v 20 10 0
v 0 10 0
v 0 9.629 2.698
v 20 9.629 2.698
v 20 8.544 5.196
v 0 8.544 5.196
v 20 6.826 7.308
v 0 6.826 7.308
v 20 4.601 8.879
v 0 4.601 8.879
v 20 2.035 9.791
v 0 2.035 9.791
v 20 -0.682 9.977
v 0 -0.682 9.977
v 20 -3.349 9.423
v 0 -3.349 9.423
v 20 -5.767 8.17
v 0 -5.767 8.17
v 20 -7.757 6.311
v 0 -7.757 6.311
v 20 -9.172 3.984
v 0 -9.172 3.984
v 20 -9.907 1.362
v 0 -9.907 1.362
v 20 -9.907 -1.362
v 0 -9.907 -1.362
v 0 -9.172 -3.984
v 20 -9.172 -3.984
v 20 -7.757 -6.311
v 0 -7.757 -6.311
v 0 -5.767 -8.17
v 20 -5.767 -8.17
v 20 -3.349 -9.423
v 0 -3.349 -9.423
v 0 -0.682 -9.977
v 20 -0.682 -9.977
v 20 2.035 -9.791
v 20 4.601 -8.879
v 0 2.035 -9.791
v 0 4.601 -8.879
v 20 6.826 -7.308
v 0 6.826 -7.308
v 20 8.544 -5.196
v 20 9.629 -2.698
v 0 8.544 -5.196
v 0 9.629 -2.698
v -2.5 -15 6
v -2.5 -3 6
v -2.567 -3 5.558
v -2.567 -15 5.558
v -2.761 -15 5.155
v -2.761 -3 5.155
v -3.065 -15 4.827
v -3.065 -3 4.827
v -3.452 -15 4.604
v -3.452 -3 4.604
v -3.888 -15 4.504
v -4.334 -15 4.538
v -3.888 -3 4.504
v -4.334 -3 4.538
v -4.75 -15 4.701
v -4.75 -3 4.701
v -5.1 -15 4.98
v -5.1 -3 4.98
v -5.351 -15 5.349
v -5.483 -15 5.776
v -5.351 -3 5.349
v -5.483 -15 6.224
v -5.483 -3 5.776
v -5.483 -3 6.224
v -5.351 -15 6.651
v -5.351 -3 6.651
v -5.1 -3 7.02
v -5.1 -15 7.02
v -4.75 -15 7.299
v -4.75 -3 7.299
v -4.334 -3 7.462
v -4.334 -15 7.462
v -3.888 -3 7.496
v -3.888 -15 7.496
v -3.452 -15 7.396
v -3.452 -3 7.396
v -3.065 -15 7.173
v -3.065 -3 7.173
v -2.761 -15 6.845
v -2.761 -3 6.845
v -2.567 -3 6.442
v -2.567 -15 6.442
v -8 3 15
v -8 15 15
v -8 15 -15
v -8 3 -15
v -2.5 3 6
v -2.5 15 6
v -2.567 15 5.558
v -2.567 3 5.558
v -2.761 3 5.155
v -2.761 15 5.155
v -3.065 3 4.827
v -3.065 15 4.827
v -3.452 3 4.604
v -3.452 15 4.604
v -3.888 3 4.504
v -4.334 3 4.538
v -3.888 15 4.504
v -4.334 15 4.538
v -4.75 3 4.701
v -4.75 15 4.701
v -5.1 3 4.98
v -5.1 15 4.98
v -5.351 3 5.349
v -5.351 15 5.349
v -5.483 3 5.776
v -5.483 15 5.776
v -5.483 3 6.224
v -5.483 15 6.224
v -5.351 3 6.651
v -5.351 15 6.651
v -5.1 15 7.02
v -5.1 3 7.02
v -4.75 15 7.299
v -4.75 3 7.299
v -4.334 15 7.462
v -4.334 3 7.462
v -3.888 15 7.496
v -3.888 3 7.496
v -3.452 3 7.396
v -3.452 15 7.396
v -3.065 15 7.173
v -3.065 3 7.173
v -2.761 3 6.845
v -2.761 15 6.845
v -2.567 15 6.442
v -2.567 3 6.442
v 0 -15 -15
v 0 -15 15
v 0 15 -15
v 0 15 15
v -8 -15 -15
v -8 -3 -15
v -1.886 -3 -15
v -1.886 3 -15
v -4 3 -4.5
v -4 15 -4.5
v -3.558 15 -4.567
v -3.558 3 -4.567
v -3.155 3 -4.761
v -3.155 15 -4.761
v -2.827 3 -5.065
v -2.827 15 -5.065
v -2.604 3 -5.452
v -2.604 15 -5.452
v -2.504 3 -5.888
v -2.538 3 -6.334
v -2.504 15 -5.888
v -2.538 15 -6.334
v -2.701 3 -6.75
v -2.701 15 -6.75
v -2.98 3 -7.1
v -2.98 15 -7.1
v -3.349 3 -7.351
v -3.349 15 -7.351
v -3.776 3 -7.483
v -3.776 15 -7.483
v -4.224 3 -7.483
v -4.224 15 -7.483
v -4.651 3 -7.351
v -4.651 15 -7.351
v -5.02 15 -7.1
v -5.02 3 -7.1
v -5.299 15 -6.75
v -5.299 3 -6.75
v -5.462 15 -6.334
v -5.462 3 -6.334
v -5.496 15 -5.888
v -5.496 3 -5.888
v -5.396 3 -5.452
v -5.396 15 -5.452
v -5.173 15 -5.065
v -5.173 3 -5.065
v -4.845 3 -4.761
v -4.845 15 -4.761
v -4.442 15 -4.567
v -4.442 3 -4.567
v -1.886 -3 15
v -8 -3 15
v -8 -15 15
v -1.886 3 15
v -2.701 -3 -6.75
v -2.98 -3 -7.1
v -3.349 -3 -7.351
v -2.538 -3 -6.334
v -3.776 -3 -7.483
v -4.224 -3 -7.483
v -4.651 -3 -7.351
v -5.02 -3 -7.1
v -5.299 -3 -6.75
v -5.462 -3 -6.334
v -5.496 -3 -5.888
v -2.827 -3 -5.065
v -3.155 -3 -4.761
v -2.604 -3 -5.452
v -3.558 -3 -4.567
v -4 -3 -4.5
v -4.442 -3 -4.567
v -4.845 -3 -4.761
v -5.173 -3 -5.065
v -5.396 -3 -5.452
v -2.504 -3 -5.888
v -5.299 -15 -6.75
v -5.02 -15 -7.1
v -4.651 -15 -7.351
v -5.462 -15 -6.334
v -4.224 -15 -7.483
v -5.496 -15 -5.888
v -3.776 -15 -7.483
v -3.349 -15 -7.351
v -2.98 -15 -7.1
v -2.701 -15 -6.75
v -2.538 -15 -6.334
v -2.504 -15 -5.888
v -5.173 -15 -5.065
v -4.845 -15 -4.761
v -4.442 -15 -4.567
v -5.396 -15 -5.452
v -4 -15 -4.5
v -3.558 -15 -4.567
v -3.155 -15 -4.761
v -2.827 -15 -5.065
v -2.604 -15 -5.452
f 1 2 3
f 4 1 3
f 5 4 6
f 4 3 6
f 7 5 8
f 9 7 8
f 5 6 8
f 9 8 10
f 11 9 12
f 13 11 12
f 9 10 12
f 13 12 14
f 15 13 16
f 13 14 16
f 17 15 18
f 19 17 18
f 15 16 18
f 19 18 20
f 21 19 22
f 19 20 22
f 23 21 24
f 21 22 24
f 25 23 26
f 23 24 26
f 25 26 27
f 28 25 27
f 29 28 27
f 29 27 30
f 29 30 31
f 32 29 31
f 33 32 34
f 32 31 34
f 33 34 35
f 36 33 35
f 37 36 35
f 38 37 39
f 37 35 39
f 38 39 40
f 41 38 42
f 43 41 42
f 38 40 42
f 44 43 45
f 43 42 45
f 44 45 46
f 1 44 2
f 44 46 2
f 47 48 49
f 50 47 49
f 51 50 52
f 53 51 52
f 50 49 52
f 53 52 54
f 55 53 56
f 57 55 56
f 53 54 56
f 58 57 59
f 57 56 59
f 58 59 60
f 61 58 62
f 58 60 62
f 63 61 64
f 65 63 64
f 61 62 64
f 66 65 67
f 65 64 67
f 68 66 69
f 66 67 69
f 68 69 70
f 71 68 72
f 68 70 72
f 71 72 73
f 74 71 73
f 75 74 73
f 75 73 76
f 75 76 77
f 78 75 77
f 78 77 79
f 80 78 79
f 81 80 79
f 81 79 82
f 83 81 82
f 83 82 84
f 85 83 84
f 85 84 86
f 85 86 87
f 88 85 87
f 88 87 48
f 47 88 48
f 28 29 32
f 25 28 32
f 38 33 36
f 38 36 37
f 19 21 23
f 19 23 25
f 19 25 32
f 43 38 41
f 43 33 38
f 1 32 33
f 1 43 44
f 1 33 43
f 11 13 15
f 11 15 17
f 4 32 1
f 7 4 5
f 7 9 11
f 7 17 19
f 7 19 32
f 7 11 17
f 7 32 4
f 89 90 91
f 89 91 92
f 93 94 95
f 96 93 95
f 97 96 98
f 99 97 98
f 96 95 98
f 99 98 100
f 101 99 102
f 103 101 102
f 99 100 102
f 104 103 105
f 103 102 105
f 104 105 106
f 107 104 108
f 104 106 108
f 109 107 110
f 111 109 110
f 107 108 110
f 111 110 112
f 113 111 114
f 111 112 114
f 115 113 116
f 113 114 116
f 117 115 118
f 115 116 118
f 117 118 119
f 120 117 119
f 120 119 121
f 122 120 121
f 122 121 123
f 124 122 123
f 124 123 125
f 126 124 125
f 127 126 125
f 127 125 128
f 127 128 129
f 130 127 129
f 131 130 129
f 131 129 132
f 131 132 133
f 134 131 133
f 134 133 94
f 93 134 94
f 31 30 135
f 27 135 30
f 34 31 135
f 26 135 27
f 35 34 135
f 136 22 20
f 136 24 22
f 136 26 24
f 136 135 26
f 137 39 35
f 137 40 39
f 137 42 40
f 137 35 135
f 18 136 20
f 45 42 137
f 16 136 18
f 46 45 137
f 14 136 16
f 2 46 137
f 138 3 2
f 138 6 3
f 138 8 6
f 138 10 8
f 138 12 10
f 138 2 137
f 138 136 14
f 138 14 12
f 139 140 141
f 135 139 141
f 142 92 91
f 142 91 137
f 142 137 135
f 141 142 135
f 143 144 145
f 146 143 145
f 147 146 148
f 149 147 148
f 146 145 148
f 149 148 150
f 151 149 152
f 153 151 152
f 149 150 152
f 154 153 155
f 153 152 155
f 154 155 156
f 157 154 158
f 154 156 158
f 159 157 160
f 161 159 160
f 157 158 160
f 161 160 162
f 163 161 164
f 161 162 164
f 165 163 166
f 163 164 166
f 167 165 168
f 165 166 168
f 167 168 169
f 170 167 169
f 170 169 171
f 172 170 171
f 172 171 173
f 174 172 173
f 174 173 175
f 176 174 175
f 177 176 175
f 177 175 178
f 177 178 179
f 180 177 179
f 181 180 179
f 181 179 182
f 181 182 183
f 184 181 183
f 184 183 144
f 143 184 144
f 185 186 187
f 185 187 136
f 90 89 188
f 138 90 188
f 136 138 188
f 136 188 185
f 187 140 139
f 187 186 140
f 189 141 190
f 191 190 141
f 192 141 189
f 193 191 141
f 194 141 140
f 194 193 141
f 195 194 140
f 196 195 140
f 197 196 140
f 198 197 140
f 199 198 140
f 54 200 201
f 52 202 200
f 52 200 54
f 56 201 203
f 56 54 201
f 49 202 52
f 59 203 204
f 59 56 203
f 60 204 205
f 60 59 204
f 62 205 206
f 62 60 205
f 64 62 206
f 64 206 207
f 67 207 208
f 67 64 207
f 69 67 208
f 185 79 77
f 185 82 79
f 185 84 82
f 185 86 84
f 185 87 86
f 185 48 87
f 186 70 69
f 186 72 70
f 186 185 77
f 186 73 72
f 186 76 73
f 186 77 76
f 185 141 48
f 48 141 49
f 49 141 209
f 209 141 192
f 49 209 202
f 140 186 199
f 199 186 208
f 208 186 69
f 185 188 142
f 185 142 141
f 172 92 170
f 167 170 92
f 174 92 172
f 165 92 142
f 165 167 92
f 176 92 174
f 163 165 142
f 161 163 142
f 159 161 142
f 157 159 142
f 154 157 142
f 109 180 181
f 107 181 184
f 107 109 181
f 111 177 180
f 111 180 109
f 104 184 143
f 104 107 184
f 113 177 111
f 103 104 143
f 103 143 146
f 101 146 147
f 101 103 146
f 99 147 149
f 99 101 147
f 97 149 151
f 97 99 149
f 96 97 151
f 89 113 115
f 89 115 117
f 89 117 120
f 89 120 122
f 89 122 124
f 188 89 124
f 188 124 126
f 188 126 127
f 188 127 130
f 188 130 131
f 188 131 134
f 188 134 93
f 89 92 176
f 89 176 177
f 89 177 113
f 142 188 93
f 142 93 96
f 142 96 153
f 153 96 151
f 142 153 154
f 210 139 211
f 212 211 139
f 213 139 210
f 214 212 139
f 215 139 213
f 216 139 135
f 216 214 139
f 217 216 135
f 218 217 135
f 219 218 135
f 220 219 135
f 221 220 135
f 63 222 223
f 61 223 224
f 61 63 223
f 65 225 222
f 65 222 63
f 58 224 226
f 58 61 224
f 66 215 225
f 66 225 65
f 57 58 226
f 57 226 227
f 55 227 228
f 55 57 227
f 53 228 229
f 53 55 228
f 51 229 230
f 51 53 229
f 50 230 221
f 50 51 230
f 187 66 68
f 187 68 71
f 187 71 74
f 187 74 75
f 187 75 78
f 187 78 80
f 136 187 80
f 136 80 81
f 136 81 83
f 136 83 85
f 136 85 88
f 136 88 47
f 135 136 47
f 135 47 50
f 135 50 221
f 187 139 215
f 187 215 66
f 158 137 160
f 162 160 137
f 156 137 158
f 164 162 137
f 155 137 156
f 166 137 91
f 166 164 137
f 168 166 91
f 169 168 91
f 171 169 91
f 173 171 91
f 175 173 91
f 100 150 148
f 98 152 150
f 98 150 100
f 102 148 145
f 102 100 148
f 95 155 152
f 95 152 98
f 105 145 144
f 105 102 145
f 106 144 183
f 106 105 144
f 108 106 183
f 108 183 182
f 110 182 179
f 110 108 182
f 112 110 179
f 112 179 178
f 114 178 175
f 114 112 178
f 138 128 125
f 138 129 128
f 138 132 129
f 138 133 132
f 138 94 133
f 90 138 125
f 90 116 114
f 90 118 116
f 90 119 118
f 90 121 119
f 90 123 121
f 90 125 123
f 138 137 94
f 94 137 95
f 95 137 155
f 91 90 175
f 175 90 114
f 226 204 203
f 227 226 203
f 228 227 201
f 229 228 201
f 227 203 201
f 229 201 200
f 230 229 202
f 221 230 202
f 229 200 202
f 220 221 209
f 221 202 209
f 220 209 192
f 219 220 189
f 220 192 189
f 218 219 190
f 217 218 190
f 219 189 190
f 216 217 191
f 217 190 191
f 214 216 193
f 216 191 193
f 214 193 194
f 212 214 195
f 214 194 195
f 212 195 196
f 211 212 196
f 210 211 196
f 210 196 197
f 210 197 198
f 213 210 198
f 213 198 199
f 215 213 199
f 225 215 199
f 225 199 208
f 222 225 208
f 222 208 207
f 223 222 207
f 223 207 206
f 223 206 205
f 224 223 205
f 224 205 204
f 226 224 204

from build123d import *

# Parameters (mm, degrees)
BOSS_EXTRUDE1_DEPTH = 15
SKETCH2_R           = 1.5
CUT_EXTRUDE1_DEPTH  = 35.481879299
SKETCH3_R           = 10
BOSS_EXTRUDE2_DEPTH = 20


with BuildPart() as part:
    # Sketch1 → Boss-Extrude1 (new, symmetric)
    with BuildSketch(Plane.XY):
        Polygon((0, -15), (0, 15), (-8, 15), (-8, 3), (-1.885714286, 3), (-1.885714286, -3), (-8, -3), (-8, -15), align=None)
    extrude(amount=BOSS_EXTRUDE1_DEPTH, both=True)

    # Sketch2 → Cut-Extrude1 (cut, through all)
    with BuildSketch(Plane(origin=(0, 15, 0), x_dir=(1, 0, 0), z_dir=(0, 1, 0))):
        with Locations(Location((-4, 6, 0), (0, 0, 270))):
            Circle(SKETCH2_R)
        with Locations((-4, -6)):
            Circle(SKETCH2_R)
    extrude(amount=-CUT_EXTRUDE1_DEPTH, mode=Mode.SUBTRACT)

    # Sketch3 → Boss-Extrude2 (add)
    with BuildSketch(Plane(origin=(0, 0, 0), x_dir=(0, 0, -1), z_dir=(1, 0, 0))):
        with Locations(Location((0, 0, 0), (0, 0, 90))):
            Circle(SKETCH3_R)
    extrude(amount=BOSS_EXTRUDE2_DEPTH)


solid = part.part
